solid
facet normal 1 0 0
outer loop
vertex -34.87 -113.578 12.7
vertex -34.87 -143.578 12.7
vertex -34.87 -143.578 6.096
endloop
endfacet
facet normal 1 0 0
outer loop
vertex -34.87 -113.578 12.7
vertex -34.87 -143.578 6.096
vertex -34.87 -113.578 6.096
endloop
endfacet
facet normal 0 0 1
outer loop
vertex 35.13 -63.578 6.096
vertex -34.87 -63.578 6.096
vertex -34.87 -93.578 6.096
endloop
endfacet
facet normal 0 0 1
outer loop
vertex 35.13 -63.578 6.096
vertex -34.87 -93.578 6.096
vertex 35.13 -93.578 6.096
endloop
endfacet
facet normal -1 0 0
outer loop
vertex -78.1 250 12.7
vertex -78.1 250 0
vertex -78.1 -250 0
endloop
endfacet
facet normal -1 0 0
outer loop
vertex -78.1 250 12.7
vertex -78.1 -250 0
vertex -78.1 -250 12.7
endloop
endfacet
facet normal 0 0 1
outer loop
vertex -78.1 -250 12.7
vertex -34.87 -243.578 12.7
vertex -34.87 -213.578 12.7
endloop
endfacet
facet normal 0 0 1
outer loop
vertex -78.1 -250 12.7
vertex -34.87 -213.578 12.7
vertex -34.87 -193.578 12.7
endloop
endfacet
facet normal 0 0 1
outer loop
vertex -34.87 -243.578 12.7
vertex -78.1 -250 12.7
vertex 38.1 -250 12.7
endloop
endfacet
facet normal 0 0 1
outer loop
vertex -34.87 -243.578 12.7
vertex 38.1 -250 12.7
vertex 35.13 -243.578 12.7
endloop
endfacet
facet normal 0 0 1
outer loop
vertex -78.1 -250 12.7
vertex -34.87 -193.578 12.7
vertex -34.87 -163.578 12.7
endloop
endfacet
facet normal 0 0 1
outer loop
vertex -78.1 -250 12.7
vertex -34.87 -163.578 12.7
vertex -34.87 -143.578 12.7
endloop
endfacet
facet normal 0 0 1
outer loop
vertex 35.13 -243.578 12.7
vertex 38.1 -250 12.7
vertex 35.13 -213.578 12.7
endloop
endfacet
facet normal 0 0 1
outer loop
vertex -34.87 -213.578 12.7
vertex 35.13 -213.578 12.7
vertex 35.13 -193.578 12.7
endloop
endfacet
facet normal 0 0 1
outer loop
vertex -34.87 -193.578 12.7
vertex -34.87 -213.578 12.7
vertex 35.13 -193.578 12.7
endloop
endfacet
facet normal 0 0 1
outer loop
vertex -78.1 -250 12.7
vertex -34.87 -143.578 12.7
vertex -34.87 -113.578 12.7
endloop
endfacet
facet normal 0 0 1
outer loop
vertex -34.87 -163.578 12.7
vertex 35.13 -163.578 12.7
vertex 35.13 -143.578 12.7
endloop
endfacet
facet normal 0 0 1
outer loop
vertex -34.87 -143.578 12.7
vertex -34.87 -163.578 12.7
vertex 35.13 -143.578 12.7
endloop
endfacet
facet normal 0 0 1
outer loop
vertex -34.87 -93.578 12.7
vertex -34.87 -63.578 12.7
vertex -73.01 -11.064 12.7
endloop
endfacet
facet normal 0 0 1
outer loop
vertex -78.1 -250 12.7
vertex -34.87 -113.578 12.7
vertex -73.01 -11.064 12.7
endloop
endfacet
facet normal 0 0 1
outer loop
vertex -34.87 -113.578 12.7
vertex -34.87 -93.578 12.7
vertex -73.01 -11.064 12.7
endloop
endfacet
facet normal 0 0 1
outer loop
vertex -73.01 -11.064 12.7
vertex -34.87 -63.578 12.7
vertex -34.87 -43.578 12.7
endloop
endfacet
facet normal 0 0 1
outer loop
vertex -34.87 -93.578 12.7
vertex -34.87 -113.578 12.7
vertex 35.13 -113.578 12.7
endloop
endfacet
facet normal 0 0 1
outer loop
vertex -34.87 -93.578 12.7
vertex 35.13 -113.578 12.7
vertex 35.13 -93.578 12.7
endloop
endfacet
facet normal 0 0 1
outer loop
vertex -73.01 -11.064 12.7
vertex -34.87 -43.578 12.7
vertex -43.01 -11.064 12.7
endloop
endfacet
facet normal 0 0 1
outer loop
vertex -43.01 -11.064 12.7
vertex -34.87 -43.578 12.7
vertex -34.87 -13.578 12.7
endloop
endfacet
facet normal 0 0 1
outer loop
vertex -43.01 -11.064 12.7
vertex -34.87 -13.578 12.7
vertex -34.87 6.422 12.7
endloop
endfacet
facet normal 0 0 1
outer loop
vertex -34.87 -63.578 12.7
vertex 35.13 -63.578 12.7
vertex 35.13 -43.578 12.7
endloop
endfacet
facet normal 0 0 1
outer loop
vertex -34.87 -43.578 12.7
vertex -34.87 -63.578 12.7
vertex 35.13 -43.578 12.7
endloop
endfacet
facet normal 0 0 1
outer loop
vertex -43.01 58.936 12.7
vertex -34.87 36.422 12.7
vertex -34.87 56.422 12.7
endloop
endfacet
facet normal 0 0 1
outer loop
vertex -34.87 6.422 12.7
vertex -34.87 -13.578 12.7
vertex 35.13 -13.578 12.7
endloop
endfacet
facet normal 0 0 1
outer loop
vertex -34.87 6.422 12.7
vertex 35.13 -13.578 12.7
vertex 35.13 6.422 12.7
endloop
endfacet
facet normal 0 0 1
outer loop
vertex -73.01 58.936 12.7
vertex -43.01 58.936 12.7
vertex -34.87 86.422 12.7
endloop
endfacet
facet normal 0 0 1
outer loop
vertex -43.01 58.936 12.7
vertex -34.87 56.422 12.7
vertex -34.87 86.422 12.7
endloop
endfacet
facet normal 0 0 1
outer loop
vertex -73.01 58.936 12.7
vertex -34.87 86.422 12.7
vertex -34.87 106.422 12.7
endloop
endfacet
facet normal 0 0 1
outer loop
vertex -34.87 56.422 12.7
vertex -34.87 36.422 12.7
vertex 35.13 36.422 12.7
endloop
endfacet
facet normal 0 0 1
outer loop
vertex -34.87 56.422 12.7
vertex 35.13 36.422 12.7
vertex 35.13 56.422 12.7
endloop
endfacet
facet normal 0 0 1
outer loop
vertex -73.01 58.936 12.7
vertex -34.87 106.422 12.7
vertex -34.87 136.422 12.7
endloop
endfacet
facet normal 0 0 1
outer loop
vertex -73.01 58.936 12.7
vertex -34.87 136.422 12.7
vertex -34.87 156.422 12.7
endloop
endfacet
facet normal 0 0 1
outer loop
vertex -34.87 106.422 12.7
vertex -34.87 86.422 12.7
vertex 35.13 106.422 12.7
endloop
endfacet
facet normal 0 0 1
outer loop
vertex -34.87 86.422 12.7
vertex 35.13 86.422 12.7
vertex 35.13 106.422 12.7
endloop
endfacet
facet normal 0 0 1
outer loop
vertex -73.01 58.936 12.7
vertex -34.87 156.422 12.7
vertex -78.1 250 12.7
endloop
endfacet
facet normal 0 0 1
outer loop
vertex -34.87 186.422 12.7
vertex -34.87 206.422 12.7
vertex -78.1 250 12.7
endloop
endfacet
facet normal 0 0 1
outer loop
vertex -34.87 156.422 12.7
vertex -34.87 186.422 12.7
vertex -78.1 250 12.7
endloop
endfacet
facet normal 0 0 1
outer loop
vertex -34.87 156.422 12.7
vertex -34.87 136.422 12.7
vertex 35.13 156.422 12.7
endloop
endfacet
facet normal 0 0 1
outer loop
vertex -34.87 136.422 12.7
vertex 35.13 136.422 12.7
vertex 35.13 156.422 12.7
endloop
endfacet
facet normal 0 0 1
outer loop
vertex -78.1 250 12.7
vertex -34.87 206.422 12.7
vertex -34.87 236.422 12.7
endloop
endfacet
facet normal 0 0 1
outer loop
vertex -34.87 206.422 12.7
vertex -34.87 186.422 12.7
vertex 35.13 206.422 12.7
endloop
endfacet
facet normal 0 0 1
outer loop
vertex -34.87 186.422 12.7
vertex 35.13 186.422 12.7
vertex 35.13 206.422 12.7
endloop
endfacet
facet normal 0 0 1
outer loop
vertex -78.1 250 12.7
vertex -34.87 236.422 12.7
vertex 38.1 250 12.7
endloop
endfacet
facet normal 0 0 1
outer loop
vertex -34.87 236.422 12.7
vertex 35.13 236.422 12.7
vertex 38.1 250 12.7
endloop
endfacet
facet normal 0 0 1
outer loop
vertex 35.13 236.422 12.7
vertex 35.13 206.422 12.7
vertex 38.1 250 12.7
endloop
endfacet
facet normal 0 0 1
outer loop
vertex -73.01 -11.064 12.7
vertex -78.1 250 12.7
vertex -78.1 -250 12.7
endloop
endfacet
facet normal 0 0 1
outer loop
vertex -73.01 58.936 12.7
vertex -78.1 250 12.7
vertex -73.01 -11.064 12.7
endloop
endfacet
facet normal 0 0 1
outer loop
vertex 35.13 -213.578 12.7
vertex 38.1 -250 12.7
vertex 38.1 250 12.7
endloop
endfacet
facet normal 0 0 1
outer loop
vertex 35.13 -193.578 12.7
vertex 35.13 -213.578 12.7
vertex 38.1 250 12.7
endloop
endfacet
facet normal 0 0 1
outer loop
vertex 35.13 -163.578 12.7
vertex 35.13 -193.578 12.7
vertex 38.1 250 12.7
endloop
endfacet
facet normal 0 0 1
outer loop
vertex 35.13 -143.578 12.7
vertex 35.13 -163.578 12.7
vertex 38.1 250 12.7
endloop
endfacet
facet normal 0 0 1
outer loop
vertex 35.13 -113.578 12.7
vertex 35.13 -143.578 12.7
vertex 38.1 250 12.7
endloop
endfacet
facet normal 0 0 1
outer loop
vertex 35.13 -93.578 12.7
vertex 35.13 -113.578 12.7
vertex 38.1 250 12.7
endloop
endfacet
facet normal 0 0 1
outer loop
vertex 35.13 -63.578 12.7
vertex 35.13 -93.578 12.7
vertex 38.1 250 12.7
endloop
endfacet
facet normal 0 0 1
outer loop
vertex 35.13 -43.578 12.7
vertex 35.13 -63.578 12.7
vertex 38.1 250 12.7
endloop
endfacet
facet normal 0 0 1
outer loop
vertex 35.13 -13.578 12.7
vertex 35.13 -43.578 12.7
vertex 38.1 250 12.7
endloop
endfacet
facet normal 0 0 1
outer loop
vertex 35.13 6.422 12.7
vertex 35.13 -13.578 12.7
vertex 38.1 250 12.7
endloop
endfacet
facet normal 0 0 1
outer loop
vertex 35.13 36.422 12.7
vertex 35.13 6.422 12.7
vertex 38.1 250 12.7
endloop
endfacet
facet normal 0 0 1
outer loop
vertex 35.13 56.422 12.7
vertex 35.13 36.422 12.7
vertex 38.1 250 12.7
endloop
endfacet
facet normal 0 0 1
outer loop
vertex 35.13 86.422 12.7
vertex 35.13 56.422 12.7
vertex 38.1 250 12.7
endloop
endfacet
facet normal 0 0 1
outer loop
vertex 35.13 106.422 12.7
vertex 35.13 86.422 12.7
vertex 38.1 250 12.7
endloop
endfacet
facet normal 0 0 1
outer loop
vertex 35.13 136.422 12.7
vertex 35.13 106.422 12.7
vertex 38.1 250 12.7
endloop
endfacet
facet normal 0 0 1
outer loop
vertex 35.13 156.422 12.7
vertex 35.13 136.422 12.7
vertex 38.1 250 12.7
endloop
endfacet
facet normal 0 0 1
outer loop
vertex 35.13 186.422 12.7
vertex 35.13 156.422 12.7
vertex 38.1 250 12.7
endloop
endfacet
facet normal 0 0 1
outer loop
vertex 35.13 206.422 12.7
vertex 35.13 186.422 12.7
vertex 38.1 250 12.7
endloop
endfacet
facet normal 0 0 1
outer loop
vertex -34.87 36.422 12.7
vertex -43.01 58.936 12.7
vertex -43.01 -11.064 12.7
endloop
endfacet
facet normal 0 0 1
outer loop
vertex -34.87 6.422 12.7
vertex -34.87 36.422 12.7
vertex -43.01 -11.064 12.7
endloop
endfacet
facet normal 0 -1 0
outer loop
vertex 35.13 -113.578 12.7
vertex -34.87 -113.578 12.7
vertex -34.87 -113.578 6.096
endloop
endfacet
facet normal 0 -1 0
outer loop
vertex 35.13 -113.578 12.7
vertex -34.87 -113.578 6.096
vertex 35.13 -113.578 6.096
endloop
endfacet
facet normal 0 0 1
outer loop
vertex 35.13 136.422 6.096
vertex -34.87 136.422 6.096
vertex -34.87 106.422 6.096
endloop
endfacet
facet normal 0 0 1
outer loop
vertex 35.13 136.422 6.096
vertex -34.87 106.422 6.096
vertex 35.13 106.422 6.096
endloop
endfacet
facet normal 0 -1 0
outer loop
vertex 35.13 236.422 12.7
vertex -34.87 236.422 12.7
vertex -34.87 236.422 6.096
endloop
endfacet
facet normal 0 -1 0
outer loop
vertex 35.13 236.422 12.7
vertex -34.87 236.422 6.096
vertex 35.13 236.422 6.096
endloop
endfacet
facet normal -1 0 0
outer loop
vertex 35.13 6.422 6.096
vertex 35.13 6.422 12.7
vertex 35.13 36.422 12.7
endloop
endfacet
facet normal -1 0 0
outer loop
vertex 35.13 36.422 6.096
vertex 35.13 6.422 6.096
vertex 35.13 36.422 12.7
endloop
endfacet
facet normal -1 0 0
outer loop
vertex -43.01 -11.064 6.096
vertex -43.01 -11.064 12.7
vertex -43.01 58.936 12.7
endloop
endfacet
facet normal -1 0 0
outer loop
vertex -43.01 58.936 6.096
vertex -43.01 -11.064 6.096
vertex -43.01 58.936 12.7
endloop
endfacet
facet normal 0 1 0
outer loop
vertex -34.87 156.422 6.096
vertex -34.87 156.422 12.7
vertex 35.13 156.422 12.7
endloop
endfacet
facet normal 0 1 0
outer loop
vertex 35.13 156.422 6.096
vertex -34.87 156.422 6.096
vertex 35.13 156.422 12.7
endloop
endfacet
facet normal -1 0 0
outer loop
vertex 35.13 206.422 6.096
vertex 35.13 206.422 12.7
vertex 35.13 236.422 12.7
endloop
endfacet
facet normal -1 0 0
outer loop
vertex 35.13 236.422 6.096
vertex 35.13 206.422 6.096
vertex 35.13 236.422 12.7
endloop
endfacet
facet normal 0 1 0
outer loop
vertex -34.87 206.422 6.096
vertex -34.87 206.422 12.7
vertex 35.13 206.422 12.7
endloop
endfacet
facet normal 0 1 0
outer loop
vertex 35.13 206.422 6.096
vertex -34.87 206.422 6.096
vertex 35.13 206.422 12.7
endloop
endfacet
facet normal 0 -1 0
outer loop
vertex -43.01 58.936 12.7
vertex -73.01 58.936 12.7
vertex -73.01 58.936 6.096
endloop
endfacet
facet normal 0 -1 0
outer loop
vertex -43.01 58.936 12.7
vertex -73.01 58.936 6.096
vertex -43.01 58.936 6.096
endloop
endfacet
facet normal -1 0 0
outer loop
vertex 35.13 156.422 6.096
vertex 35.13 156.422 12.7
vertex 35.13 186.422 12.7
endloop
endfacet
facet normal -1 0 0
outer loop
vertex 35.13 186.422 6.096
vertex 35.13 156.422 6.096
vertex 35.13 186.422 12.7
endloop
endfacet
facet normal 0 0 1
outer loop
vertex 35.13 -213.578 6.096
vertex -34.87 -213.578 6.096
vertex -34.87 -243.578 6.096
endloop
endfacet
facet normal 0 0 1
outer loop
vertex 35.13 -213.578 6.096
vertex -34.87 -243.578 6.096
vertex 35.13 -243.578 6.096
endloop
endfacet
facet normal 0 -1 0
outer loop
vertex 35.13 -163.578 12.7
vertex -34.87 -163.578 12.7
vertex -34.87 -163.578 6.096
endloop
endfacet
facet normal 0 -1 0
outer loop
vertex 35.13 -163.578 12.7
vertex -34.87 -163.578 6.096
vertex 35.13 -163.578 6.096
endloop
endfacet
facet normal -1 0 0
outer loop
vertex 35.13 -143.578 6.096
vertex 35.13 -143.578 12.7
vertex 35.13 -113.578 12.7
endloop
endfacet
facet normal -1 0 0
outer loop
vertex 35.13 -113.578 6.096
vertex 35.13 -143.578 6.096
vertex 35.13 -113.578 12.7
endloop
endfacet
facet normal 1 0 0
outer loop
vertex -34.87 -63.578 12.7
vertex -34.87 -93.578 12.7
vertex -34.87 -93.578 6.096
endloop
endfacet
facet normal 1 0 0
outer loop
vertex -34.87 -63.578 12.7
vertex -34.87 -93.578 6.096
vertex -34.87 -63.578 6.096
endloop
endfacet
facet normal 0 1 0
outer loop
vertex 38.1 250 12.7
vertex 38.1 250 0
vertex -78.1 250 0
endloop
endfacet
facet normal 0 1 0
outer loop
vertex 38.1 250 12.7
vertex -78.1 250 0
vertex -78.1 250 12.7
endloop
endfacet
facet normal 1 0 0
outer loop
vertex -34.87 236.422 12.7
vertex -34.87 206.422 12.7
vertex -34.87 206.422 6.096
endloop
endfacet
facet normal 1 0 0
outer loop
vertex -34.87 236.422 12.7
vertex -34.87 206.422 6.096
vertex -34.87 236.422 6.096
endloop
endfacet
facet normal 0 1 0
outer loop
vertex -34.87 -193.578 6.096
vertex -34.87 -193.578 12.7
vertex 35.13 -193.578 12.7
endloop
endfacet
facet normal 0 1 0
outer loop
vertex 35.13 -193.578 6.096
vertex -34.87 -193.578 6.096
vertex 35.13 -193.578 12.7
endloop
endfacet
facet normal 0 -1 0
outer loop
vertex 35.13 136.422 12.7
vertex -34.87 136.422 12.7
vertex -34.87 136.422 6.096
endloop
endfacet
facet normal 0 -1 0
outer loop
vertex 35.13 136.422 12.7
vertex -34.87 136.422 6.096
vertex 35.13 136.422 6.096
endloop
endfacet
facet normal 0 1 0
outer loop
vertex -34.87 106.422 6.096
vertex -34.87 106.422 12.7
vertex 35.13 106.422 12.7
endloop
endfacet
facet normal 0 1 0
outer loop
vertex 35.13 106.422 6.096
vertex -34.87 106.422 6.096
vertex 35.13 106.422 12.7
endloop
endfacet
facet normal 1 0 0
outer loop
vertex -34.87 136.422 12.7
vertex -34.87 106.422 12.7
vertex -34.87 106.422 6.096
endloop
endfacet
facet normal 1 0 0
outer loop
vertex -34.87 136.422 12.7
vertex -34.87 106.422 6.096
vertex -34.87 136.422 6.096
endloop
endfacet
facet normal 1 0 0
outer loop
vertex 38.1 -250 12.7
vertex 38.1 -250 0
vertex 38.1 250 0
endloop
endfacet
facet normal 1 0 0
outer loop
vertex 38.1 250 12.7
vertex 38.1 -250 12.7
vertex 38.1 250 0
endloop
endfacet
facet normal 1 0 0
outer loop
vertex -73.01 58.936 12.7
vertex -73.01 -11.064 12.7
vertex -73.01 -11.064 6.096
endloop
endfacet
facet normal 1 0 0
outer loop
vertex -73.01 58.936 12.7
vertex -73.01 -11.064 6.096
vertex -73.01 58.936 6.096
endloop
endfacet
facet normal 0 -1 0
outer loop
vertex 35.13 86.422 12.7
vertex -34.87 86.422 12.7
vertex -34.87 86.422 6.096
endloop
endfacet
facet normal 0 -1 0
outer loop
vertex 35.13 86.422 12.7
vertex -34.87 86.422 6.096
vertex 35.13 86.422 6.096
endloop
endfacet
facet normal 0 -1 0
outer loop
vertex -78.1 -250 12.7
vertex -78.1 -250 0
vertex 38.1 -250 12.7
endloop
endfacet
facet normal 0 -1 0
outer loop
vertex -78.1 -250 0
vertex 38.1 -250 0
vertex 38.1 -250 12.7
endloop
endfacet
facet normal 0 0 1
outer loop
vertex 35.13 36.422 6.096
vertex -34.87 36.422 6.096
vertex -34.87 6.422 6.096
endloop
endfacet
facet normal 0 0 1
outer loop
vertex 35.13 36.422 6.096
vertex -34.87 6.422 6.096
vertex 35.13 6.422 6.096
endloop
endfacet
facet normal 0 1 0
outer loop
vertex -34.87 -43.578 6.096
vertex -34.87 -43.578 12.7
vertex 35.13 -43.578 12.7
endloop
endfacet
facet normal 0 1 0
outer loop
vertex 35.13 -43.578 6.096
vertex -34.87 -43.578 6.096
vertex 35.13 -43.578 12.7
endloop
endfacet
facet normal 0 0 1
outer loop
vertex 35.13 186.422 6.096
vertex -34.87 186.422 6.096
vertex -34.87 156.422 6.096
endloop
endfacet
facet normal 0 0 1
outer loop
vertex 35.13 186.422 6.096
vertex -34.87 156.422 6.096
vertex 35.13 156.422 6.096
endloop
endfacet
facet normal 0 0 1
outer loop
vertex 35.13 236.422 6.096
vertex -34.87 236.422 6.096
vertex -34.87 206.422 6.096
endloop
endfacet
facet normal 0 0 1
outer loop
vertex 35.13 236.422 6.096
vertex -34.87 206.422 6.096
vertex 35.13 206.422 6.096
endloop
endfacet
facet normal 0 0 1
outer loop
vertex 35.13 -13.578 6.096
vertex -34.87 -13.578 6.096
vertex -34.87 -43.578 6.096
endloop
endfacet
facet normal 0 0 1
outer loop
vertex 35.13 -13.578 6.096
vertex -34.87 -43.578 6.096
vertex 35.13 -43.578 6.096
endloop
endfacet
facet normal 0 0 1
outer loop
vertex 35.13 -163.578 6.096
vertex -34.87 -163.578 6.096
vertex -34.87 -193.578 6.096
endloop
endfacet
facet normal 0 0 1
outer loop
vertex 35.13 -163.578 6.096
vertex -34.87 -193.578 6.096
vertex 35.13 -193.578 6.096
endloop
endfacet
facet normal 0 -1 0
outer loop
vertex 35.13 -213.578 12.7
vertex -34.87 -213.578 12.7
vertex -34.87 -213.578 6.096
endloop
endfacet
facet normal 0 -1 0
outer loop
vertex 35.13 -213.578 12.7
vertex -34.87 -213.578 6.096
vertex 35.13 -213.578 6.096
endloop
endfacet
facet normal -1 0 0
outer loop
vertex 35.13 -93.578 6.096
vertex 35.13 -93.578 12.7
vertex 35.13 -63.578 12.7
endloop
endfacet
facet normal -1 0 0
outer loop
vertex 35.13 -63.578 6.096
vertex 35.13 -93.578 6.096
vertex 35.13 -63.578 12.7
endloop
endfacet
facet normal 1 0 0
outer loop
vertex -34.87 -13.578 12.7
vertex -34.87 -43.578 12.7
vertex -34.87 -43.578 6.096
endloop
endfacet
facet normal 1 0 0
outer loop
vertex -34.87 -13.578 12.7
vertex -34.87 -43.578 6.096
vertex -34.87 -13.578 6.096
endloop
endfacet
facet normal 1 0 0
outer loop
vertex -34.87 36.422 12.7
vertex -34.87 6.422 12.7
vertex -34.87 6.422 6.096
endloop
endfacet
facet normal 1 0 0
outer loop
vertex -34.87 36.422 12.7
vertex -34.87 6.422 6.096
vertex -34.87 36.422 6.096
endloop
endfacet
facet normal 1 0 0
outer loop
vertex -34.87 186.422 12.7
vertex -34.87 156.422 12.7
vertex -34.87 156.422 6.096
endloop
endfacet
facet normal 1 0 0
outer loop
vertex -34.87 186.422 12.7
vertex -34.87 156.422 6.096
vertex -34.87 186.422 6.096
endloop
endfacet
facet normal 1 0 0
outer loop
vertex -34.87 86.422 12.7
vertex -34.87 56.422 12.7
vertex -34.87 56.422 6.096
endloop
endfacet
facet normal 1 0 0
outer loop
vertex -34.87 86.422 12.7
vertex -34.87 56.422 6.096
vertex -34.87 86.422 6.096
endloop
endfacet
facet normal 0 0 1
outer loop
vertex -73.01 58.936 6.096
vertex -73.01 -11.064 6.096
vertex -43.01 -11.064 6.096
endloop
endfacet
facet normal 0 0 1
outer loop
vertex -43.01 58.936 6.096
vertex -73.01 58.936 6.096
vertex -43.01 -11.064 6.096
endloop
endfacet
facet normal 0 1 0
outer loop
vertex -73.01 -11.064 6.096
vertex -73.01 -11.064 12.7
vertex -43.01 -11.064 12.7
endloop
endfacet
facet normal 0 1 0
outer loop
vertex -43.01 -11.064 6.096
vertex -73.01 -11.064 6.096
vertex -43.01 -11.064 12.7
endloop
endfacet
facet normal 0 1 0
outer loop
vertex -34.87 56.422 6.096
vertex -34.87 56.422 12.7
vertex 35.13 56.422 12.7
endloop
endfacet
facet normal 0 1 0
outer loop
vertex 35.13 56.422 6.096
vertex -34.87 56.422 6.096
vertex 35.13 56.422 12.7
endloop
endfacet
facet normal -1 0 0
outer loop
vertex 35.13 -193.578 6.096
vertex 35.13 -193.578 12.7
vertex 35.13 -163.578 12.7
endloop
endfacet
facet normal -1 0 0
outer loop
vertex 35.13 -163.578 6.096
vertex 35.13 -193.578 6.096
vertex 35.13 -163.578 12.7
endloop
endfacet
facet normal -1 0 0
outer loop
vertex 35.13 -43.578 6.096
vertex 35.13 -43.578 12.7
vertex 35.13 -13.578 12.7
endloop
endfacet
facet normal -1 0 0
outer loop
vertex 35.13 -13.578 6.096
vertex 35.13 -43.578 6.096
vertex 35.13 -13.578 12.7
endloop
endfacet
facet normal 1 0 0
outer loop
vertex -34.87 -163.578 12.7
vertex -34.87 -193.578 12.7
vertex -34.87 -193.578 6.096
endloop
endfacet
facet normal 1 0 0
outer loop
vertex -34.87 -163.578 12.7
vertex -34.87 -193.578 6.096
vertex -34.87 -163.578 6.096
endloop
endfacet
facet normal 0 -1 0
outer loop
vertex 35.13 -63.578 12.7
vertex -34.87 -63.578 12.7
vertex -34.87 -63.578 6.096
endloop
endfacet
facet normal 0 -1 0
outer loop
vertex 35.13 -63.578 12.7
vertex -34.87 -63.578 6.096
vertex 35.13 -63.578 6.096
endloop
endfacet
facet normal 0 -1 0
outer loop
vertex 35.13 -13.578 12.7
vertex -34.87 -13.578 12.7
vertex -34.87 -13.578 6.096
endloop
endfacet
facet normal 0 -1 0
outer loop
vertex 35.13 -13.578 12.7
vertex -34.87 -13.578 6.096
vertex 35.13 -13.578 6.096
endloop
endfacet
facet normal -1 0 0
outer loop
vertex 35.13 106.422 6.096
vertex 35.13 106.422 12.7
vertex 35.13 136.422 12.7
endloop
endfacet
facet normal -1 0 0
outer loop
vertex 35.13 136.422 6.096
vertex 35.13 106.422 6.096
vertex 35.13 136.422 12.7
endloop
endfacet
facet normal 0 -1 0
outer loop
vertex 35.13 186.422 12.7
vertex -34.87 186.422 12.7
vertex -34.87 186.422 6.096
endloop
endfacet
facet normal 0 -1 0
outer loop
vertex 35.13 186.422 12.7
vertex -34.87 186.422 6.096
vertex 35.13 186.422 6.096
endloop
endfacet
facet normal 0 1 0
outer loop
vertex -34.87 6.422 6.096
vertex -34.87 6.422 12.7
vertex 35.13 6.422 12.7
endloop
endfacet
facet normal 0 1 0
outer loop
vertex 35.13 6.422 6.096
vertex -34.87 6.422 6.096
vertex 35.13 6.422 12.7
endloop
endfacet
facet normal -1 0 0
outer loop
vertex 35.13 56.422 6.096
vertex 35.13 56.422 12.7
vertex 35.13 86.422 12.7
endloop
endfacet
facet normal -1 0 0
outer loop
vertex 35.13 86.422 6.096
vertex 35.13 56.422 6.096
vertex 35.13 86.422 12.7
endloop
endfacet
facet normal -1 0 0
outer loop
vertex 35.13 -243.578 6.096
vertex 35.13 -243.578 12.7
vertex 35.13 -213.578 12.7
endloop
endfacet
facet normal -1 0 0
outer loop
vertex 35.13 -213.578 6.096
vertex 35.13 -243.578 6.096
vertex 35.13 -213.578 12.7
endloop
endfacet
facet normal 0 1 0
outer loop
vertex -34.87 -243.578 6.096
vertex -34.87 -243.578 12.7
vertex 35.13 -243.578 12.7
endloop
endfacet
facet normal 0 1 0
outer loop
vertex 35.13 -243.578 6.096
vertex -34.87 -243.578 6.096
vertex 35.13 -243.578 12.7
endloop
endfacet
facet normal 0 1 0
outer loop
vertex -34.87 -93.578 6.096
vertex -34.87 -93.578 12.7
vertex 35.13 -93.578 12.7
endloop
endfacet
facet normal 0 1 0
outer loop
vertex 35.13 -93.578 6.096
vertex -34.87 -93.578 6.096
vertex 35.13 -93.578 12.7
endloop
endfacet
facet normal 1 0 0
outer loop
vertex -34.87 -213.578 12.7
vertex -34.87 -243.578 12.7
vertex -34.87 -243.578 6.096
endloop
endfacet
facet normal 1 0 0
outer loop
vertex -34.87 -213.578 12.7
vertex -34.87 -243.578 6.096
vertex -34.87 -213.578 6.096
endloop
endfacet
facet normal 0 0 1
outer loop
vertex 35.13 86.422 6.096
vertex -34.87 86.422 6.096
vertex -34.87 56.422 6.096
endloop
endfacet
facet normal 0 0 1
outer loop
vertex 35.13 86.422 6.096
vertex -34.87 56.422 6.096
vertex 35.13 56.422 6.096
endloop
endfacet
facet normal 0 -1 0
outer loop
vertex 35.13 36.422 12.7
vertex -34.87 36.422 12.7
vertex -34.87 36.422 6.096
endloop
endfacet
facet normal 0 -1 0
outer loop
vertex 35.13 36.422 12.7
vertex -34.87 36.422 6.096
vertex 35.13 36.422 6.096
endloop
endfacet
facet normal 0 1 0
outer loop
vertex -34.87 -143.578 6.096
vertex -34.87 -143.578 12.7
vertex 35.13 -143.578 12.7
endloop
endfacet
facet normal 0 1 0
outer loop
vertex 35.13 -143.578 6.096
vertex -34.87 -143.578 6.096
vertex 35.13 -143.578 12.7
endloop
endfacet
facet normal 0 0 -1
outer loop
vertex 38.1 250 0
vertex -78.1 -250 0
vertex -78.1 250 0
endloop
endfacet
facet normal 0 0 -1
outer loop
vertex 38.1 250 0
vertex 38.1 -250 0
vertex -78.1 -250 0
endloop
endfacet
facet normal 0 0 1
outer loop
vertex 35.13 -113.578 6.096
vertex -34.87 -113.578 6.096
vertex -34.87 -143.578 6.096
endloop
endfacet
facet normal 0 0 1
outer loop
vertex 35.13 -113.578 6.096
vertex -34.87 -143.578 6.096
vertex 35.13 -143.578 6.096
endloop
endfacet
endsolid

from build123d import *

# Parameters (mm, degrees)
SKETCH1_W           = 76.2
SKETCH1_H           = 500
BOSS_EXTRUDE2_DEPTH = 12.7
SKETCH3_W           = 70
SKETCH3_H           = 30
CUT_EXTRUDE4_DEPTH  = 6.604
LPATTERN1_COUNT     = 10
LPATTERN1_PITCH     = 50
SKETCH4_W           = 12.7
SKETCH4_H           = 500
BOSS_EXTRUDE4_DEPTH = 40
SKETCH5_W           = 30
SKETCH5_H           = 70
CUT_EXTRUDE5_DEPTH  = 6.604


with BuildPart() as part:
    # Sketch1 → Boss-Extrude2 (new body)
    with BuildSketch(Plane.XY):
        Rectangle(SKETCH1_W, SKETCH1_H)
    extrude(amount=BOSS_EXTRUDE2_DEPTH)

    # Sketch3 → Cut-Extrude4 (cut)
    with BuildSketch(Plane.XY.offset(12.7)):
        with Locations((0.129688718, 221.422286077)):
            Rectangle(SKETCH3_W, SKETCH3_H)
    cut_extrude4 = extrude(amount=-CUT_EXTRUDE4_DEPTH, mode=Mode.SUBTRACT)

    # LPattern1: Cut-Extrude4 ×10
    with Locations(*[(0, -i * LPATTERN1_PITCH, 0) for i in range(1, LPATTERN1_COUNT)]):
        add(cut_extrude4, mode=Mode.SUBTRACT)

    # Sketch4 → Boss-Extrude4 (add)
    with BuildSketch(Plane.ZY.offset(38.1)):
        with Locations((6.35, 0)):
            Rectangle(SKETCH4_W, SKETCH4_H)
    extrude(amount=BOSS_EXTRUDE4_DEPTH)

    # Sketch5 → Cut-Extrude5 (cut)
    with BuildSketch(Plane.XY.offset(12.7)):
        with Locations((-58.010071461, 23.936214581)):
            Rectangle(SKETCH5_W, SKETCH5_H)
    extrude(amount=-CUT_EXTRUDE5_DEPTH, mode=Mode.SUBTRACT)


solid = part.part
